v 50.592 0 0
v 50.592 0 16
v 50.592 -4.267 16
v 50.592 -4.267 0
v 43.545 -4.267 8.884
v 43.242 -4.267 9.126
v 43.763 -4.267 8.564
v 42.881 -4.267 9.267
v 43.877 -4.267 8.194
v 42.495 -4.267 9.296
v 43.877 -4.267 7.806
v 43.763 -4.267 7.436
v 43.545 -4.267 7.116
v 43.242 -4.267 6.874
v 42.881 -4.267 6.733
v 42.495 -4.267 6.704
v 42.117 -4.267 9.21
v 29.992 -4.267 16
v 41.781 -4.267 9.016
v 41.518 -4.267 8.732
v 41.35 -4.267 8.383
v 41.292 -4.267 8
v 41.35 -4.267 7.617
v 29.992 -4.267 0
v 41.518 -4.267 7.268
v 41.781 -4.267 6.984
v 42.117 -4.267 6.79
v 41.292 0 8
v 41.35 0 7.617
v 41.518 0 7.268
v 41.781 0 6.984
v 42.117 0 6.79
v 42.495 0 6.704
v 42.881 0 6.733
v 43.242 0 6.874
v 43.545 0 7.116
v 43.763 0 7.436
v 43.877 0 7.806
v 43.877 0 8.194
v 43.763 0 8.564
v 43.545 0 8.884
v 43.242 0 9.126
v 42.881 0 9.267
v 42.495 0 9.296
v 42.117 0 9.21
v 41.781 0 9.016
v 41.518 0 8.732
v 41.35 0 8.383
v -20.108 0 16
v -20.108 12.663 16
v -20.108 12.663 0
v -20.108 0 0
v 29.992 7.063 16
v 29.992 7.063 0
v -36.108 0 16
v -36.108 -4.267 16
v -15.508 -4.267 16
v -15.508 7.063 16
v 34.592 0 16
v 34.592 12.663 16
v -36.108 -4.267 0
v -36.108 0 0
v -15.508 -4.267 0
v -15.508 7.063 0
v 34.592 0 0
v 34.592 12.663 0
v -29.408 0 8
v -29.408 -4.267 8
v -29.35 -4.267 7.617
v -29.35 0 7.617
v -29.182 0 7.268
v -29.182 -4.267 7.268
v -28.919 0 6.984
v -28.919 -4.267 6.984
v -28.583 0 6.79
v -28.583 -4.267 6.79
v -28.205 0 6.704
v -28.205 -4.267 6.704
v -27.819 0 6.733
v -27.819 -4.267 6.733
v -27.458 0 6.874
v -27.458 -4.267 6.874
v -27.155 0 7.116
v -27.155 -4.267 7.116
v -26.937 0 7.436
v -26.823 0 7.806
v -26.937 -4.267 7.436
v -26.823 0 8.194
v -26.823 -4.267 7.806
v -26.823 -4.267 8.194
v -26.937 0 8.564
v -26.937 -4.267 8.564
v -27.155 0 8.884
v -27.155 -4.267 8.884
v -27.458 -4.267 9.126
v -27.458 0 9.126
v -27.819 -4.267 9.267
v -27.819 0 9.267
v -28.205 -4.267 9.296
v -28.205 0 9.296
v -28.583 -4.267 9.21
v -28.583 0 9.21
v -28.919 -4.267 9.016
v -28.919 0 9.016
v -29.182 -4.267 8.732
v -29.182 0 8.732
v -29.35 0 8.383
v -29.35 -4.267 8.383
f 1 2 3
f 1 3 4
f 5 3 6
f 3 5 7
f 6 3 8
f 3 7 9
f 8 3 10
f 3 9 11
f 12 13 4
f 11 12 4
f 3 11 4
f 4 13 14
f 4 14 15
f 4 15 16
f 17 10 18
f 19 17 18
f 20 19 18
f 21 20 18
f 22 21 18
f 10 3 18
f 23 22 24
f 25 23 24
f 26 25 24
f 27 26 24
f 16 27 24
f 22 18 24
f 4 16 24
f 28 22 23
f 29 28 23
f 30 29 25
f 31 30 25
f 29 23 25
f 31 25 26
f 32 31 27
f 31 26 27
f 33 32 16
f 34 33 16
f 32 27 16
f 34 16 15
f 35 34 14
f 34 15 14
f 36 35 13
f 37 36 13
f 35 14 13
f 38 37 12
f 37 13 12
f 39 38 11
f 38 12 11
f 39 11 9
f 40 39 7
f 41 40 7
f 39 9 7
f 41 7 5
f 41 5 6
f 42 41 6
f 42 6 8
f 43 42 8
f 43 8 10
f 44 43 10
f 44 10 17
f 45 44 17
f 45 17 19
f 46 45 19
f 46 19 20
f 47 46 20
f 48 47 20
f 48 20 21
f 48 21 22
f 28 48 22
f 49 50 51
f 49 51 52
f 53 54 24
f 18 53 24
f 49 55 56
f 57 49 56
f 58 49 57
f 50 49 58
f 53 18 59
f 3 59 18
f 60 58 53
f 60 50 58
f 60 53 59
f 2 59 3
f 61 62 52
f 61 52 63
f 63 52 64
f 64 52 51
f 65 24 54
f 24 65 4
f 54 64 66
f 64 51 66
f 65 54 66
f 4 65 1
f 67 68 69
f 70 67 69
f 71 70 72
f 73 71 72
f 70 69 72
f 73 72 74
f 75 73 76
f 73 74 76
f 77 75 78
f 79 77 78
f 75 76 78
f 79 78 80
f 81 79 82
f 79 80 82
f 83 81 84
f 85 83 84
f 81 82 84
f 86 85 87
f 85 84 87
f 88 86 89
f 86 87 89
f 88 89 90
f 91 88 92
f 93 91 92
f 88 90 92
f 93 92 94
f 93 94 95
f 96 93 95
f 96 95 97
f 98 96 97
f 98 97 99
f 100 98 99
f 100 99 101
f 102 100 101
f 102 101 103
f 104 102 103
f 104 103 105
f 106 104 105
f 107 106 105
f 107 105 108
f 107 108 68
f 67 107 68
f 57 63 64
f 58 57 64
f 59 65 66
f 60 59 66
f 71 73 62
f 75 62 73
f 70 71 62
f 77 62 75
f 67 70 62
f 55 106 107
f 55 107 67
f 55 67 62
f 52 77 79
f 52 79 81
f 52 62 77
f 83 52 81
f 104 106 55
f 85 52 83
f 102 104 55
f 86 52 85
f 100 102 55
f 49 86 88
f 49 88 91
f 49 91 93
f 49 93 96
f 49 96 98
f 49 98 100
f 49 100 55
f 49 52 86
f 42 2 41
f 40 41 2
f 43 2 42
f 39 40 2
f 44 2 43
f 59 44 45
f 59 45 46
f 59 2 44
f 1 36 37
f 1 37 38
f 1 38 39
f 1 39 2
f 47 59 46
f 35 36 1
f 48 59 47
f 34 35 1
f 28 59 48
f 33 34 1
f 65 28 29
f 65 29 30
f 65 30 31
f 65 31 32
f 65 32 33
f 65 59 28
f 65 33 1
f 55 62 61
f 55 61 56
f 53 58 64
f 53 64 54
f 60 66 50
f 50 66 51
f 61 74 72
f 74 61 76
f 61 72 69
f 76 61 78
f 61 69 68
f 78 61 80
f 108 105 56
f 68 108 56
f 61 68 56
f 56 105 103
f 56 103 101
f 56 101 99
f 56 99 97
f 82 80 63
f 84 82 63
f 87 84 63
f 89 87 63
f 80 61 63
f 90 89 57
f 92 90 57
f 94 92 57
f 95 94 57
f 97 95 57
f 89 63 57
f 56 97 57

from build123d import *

# Parameters (mm, degrees)
EXTRUDE_1_DEPTH = 16
SKETCH_3_W      = 16
SKETCH_3_H      = 4.26667426
EXTRUDE_3_DEPTH = 16
SKETCH_23_W     = 16
SKETCH_23_H     = 4.26667426
EXTRUDE_4_DEPTH = 16
F_2_0MM_2_D     = 2.6
F_2_0MM_3_D     = 2.6
SKETCH_33_W     = 45.5
SKETCH_33_H     = 16
EXTRUDE_5_DEPTH = 1


with BuildPart() as part:
    # 草图2 → 凸台-拉伸1 (new body)
    with BuildSketch(Plane.XY):
        Polygon((34.591799544, 12.66332574), (-20.108200456, 12.66332574), (-20.108200456, -4.26667426), (-15.508200456, -4.26667426), (-15.508200456, 8.06332574), (29.991799544, 8.06332574), (29.991799544, -4.26667426), (34.591799544, -4.26667426), align=None)
    extrude(amount=EXTRUDE_1_DEPTH)

    # 草图3 → 凸台-拉伸3 (add)
    with BuildSketch(Plane.ZY.offset(20.108200456)):
        with Locations((8, -2.13333713)):
            Rectangle(SKETCH_3_W, SKETCH_3_H)
    extrude(amount=EXTRUDE_3_DEPTH)

    # 草图23 → 凸台-拉伸4 (add)
    with BuildSketch(Plane(origin=(34.591799544, 0, 0), x_dir=(0, 0, -1), z_dir=(1, 0, 0))):
        with Locations((-8, -2.13333713)):
            Rectangle(SKETCH_23_W, SKETCH_23_H)
    extrude(amount=EXTRUDE_4_DEPTH)

    # Ø2.0mm 暗销孔2 (through all)
    with Locations(Plane(origin=(0, 0, 0), x_dir=(1, 0, 0), z_dir=(0, 1, 0))):
        with Locations((42.591799544, -8)):
            Hole(F_2_0MM_2_D / 2)

    # Ø2.0mm 暗销孔3 (through all)
    with Locations(Plane(origin=(0, 0, 0), x_dir=(1, 0, 0), z_dir=(0, 1, 0))):
        with Locations((-28.108200456, -8)):
            Hole(F_2_0MM_3_D / 2)

    # 草图33 → 凸台-拉伸5 (add)
    with BuildSketch(Plane.XZ.offset(-8.06332574)):
        with Locations((7.241799544, 8)):
            Rectangle(SKETCH_33_W, SKETCH_33_H)
    extrude(amount=EXTRUDE_5_DEPTH)


solid = part.part
